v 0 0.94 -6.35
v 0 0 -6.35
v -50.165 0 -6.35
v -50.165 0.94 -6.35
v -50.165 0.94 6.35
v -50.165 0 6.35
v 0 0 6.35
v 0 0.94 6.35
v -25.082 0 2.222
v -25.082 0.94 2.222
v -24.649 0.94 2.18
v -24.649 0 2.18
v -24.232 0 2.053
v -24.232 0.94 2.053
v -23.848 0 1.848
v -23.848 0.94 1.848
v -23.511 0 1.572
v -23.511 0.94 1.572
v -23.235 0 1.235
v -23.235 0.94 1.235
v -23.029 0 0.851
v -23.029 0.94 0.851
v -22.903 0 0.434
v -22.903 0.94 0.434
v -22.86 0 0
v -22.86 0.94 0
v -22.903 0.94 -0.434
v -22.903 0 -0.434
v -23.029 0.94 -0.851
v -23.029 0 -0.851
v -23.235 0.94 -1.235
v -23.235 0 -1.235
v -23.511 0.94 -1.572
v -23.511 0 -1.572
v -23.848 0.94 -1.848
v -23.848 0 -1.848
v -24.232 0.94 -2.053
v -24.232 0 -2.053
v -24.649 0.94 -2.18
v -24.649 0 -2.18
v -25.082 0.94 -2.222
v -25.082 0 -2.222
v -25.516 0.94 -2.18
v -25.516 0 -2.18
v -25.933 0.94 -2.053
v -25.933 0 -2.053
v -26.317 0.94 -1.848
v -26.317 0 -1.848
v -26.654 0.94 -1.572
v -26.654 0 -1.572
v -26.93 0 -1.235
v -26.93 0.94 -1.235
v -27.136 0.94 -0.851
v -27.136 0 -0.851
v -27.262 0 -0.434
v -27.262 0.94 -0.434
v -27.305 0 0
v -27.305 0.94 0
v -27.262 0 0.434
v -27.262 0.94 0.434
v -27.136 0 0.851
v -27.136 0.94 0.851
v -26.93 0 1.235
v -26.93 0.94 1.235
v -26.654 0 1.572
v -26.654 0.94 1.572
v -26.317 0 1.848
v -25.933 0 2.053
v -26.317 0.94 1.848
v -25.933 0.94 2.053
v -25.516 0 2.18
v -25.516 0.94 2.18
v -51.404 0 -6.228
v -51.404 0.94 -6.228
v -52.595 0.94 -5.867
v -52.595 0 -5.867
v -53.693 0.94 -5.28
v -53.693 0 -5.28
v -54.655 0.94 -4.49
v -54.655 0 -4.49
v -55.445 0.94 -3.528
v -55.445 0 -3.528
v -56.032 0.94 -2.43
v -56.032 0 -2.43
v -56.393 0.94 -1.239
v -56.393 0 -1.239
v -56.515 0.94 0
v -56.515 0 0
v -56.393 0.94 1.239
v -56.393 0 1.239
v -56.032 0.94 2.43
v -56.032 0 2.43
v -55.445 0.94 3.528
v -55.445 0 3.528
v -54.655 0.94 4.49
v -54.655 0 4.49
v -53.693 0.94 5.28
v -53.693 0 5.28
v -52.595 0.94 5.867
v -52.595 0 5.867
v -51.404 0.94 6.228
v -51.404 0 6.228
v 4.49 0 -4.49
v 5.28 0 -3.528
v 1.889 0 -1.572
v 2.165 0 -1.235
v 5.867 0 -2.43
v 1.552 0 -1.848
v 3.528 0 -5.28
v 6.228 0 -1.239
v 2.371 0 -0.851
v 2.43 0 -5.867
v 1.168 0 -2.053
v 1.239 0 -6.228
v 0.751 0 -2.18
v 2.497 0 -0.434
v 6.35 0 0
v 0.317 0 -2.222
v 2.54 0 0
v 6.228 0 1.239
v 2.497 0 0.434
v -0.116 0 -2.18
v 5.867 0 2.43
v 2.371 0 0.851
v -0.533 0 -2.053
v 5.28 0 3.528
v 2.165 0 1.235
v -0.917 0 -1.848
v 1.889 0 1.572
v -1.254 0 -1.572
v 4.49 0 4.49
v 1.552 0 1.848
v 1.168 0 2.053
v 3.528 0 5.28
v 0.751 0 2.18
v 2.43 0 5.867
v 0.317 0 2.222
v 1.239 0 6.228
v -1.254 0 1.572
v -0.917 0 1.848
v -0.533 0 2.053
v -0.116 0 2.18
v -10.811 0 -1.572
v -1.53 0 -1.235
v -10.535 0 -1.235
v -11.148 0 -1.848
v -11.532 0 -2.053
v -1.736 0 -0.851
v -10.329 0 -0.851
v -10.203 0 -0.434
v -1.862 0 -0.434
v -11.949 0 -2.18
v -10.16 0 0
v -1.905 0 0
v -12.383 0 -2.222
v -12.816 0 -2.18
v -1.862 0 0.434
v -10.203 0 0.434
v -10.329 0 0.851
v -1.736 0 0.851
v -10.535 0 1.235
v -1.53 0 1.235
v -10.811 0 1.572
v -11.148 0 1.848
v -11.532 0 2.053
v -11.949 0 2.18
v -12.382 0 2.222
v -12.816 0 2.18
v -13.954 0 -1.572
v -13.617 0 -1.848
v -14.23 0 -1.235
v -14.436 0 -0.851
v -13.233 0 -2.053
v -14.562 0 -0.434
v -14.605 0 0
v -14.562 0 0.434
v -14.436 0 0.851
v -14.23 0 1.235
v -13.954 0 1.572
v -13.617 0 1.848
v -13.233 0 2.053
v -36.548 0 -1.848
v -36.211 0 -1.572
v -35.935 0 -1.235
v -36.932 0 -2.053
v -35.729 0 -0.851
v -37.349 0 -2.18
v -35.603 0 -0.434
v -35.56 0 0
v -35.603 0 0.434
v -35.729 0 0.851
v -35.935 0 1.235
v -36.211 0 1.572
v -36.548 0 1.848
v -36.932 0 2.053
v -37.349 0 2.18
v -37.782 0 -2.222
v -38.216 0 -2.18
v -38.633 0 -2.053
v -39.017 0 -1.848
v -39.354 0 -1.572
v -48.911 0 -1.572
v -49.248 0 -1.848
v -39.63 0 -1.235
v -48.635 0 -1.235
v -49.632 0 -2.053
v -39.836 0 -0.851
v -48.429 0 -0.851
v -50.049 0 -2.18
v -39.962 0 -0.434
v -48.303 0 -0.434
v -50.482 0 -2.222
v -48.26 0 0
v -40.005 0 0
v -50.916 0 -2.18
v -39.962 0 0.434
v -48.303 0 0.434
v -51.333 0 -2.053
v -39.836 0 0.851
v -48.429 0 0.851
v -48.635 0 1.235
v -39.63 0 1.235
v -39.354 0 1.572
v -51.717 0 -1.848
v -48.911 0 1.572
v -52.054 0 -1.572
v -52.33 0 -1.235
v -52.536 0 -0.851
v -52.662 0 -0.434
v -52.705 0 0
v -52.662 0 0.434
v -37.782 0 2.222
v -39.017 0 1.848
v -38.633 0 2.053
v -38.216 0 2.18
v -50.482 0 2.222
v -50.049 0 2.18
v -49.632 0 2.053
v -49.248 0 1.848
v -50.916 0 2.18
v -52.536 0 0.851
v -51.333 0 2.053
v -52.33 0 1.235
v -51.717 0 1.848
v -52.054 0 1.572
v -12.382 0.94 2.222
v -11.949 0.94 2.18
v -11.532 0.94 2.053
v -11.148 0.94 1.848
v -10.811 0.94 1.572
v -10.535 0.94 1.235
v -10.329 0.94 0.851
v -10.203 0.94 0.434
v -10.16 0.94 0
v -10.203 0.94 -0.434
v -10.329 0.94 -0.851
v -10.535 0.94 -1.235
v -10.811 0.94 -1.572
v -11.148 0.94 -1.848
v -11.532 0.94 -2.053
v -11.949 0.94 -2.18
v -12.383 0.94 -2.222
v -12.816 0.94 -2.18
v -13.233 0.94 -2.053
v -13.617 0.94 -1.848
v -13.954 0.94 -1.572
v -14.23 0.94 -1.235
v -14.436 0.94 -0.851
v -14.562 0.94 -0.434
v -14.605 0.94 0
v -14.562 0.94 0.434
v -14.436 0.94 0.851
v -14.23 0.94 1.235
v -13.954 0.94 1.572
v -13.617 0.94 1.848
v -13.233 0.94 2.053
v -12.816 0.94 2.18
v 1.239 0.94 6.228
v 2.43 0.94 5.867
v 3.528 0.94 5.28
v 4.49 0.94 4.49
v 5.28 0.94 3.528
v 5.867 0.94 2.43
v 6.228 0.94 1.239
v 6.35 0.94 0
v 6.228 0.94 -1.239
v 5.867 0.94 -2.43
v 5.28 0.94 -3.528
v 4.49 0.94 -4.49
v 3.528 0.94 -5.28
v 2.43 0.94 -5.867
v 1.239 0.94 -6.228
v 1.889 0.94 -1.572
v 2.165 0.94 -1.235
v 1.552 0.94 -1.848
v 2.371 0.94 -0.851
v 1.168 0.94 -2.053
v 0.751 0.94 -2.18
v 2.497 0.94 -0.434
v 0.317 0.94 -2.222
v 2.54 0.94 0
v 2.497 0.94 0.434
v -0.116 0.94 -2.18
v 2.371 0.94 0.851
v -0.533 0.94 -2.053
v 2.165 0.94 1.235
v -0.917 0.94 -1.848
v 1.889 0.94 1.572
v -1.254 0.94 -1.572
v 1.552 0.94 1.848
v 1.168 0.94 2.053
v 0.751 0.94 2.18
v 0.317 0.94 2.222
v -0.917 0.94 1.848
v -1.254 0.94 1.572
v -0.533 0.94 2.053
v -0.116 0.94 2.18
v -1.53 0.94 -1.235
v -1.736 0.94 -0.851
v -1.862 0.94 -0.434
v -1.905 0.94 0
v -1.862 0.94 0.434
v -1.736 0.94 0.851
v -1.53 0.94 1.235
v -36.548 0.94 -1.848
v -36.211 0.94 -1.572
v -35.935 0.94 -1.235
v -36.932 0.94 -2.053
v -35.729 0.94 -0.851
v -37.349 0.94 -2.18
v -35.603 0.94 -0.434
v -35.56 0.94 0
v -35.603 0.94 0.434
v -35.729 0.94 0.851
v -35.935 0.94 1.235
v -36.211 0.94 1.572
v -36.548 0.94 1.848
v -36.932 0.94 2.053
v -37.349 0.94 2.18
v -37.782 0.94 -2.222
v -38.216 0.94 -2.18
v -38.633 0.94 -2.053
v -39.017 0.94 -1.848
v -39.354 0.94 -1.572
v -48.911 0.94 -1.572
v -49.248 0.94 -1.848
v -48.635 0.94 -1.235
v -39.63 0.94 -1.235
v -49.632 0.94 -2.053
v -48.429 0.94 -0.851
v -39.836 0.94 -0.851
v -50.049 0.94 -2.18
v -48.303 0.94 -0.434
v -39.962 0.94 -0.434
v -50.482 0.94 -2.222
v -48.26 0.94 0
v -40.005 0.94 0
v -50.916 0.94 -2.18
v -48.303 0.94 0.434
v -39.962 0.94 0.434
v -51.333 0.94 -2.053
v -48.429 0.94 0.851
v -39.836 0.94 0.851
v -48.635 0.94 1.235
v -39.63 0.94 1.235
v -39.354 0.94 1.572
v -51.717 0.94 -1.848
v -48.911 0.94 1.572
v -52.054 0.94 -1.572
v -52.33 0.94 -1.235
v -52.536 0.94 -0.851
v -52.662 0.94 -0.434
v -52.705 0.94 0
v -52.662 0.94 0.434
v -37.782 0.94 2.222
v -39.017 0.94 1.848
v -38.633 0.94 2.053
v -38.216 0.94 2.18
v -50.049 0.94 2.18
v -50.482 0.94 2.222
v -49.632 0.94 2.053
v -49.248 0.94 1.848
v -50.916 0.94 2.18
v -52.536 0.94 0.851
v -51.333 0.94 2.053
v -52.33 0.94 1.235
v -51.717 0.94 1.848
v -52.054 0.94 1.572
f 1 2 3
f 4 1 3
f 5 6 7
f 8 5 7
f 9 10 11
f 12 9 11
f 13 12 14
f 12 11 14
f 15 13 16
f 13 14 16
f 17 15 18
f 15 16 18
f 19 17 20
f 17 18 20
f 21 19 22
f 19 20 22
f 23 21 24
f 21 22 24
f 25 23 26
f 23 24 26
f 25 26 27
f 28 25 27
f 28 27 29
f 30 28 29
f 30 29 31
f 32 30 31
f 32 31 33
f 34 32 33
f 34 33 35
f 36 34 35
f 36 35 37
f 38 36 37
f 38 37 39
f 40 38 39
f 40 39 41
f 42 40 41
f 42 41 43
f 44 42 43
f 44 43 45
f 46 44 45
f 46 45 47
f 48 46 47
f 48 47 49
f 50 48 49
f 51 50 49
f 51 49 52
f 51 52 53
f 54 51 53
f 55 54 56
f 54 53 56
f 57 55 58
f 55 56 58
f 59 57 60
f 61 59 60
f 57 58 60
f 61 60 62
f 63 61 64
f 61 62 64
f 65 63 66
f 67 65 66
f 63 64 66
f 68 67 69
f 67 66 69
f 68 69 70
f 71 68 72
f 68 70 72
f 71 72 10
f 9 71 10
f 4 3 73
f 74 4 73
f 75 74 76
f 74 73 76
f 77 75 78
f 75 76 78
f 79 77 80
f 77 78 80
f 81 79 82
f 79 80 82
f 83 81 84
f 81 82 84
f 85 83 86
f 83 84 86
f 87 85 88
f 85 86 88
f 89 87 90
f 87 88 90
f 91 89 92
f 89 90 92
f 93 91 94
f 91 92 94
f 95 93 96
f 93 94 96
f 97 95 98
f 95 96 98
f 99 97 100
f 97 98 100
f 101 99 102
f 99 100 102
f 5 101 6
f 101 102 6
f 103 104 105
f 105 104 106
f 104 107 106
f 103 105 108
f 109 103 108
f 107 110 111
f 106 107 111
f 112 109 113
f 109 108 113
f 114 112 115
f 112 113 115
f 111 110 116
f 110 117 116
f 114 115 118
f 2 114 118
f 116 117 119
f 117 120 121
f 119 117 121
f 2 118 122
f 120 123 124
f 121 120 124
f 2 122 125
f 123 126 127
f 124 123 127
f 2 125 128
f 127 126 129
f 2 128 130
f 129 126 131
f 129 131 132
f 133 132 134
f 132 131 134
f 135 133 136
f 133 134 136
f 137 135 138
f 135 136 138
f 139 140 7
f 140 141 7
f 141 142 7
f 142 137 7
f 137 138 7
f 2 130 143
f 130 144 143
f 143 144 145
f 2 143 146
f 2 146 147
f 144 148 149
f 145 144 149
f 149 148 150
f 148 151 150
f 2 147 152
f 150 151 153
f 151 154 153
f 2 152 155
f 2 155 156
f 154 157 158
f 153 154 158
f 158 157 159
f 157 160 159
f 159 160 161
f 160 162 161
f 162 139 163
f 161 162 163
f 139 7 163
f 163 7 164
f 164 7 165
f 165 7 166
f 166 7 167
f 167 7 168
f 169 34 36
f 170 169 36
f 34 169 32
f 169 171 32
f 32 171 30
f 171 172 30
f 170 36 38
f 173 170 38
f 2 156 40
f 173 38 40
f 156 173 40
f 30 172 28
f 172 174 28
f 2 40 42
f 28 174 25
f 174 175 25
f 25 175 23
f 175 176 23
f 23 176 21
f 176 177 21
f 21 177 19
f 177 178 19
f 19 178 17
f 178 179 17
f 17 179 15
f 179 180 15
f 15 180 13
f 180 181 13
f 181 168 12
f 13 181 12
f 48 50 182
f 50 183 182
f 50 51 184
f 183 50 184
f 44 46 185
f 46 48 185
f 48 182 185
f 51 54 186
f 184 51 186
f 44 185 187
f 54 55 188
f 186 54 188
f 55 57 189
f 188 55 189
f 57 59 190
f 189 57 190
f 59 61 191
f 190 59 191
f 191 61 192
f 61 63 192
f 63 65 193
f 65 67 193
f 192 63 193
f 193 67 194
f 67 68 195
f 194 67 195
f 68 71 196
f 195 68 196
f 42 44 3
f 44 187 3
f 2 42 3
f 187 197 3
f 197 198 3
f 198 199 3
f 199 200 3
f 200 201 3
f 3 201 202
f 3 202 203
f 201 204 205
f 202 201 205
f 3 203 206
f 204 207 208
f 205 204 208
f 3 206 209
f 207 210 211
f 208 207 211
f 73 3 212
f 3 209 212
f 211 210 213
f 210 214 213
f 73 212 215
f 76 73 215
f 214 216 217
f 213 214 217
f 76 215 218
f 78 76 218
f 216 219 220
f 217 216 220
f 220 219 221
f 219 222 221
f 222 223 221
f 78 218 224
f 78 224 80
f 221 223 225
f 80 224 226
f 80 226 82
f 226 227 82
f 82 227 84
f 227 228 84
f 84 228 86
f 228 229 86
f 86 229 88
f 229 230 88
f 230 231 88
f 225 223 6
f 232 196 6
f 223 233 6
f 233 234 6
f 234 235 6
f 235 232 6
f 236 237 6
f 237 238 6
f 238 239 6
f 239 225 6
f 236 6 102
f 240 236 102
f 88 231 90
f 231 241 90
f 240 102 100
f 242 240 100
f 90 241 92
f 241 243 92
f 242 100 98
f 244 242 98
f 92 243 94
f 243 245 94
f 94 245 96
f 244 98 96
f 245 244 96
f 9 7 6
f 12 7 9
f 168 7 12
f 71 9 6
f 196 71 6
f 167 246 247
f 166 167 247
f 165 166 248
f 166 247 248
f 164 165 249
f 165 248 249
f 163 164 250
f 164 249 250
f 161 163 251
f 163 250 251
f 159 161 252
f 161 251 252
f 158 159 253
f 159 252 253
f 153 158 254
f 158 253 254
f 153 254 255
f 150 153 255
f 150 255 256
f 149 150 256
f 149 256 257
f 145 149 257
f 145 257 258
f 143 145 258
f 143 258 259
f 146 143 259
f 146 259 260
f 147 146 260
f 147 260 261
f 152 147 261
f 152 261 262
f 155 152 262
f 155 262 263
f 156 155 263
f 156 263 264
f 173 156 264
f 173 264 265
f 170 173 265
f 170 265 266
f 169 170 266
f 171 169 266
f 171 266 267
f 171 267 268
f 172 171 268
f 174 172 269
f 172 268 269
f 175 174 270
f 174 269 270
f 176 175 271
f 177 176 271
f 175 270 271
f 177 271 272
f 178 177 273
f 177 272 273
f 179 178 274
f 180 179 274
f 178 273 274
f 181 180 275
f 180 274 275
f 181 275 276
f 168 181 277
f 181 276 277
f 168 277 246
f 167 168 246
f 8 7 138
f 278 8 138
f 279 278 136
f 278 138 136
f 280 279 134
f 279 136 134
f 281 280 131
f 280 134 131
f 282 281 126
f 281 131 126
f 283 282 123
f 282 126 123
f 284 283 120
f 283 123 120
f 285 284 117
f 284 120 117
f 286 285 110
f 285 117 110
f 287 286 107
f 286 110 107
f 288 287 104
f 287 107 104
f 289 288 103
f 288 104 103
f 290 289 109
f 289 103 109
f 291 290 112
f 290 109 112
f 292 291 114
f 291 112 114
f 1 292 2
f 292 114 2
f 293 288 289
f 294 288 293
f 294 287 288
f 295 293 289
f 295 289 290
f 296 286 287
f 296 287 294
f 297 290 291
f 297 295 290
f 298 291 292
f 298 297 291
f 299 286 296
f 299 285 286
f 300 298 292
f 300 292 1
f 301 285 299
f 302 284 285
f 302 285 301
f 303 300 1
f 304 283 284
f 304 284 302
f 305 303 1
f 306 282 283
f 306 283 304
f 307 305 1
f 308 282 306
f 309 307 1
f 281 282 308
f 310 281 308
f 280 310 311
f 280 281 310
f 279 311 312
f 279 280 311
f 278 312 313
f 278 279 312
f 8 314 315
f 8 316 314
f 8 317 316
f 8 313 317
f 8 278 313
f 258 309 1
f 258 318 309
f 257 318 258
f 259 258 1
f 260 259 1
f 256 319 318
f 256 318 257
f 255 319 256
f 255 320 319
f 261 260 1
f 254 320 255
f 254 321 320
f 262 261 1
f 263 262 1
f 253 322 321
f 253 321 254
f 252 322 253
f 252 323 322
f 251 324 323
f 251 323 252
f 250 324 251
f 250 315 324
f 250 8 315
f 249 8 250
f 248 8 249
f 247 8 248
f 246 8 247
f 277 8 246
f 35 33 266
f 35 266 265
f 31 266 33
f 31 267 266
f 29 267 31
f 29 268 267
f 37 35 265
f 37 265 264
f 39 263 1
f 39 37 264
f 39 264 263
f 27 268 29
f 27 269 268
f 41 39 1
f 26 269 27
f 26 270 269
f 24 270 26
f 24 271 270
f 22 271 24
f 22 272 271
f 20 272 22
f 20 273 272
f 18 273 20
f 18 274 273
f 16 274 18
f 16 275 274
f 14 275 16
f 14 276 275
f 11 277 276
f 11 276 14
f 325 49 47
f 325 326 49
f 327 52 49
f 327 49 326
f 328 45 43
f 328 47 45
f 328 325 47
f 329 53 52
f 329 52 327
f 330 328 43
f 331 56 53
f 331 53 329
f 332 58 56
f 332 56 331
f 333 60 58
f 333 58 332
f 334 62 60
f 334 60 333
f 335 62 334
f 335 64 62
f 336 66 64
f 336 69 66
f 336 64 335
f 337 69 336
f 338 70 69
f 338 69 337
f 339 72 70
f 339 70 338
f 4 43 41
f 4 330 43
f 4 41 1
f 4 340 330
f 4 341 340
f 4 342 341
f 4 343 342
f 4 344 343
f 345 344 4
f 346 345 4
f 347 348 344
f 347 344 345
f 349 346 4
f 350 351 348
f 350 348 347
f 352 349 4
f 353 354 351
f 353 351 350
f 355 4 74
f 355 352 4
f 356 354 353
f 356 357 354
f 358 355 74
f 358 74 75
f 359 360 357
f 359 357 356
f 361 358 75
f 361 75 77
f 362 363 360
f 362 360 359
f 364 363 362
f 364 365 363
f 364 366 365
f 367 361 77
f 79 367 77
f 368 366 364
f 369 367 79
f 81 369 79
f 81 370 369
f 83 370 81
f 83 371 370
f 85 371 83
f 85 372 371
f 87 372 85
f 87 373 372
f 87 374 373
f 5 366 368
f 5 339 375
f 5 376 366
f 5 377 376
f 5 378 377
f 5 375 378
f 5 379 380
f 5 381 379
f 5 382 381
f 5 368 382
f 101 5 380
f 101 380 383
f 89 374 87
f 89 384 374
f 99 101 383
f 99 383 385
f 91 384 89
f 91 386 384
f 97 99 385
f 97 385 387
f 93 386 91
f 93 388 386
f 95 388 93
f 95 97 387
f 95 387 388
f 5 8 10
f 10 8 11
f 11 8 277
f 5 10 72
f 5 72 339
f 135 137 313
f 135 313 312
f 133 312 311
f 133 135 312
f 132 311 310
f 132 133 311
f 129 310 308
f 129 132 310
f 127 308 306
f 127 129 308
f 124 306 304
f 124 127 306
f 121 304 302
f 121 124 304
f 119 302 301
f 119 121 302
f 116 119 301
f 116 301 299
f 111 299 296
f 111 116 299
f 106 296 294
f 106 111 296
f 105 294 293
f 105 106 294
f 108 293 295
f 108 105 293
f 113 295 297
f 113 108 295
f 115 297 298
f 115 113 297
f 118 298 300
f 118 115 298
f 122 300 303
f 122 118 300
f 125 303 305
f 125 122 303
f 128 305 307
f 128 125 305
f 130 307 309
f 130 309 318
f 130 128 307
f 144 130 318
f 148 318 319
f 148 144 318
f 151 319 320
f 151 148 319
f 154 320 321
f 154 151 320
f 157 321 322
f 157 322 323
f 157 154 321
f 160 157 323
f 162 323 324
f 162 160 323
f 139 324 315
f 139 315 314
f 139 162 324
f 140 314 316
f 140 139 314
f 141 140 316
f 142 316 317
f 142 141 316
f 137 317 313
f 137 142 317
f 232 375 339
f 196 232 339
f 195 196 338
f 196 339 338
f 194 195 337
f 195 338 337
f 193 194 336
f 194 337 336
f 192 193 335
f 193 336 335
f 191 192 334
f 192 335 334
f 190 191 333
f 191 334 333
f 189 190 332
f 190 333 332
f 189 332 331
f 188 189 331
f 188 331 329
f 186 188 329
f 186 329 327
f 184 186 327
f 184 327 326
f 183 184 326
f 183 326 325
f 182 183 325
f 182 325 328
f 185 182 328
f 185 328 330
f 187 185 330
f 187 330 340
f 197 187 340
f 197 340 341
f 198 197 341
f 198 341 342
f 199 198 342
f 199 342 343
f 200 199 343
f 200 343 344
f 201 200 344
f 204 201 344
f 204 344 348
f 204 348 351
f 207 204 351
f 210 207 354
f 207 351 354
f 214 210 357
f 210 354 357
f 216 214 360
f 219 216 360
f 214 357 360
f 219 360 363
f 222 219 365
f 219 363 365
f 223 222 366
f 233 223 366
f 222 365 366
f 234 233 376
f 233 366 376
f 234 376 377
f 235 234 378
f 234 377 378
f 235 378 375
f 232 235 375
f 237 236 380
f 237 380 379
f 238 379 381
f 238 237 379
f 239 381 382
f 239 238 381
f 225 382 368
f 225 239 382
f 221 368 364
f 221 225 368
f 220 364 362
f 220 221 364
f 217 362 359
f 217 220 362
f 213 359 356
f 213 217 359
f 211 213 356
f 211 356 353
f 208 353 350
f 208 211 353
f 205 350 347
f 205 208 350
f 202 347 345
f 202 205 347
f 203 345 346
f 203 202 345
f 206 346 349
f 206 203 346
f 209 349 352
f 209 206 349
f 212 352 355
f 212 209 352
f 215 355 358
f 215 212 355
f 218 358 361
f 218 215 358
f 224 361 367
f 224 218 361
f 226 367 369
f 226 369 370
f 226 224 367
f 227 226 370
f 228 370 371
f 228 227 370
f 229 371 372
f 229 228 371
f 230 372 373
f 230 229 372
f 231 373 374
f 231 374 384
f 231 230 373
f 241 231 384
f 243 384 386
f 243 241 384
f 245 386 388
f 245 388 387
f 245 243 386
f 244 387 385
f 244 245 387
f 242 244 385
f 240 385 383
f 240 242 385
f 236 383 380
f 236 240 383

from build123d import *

# Parameters (mm, degrees)
SKETCH1_R                = 2.2225
BAR_DEPTH                = 0.9398
SKETCH2_R                = 2.2225
CENTER_HOLE_DEPTH        = 57.878387363
OTHER_CENTER_HOLES_COUNT = 3
OTHER_CENTER_HOLES_PITCH = 12.7


with BuildPart() as part:
    # Sketch1 → Bar (new body)
    with BuildSketch(Plane(origin=(0, 0, 0), x_dir=(-1, 0, 0), z_dir=(0, 1, 0))):
        with BuildLine():
            Line((50.165, 6.35), (0, 6.35))
            ThreePointArc((0, 6.35), (-6.35, 0), (0, -6.35))
            Line((0, -6.35), (50.165, -6.35))
            ThreePointArc((50.165, -6.35), (56.515, 0), (50.165, 6.35))
        make_face()
        with Locations(Location((50.4825, 0, 0), (0, 0, 90))):
            Circle(SKETCH1_R, mode=Mode.SUBTRACT)
        with Locations(Location((-0.3175, 0, 0), (0, 0, 90))):
            Circle(SKETCH1_R, mode=Mode.SUBTRACT)
    extrude(amount=BAR_DEPTH)

    # Sketch2 → Center Hole (cut, through all)
    with BuildSketch(Plane(origin=(0, 0.9398, 0), x_dir=(1, 0, 0), z_dir=(0, 1, 0))):
        with Locations(Location((-37.7825, 0, 0), (0, 0, 270))):
            Circle(SKETCH2_R)
    center_hole = extrude(amount=-CENTER_HOLE_DEPTH, mode=Mode.SUBTRACT)

    # Other Center Holes: Center Hole ×3
    with Locations(*[(i * OTHER_CENTER_HOLES_PITCH, 0, 0) for i in range(1, OTHER_CENTER_HOLES_COUNT)]):
        add(center_hole, mode=Mode.SUBTRACT)


solid = part.part
